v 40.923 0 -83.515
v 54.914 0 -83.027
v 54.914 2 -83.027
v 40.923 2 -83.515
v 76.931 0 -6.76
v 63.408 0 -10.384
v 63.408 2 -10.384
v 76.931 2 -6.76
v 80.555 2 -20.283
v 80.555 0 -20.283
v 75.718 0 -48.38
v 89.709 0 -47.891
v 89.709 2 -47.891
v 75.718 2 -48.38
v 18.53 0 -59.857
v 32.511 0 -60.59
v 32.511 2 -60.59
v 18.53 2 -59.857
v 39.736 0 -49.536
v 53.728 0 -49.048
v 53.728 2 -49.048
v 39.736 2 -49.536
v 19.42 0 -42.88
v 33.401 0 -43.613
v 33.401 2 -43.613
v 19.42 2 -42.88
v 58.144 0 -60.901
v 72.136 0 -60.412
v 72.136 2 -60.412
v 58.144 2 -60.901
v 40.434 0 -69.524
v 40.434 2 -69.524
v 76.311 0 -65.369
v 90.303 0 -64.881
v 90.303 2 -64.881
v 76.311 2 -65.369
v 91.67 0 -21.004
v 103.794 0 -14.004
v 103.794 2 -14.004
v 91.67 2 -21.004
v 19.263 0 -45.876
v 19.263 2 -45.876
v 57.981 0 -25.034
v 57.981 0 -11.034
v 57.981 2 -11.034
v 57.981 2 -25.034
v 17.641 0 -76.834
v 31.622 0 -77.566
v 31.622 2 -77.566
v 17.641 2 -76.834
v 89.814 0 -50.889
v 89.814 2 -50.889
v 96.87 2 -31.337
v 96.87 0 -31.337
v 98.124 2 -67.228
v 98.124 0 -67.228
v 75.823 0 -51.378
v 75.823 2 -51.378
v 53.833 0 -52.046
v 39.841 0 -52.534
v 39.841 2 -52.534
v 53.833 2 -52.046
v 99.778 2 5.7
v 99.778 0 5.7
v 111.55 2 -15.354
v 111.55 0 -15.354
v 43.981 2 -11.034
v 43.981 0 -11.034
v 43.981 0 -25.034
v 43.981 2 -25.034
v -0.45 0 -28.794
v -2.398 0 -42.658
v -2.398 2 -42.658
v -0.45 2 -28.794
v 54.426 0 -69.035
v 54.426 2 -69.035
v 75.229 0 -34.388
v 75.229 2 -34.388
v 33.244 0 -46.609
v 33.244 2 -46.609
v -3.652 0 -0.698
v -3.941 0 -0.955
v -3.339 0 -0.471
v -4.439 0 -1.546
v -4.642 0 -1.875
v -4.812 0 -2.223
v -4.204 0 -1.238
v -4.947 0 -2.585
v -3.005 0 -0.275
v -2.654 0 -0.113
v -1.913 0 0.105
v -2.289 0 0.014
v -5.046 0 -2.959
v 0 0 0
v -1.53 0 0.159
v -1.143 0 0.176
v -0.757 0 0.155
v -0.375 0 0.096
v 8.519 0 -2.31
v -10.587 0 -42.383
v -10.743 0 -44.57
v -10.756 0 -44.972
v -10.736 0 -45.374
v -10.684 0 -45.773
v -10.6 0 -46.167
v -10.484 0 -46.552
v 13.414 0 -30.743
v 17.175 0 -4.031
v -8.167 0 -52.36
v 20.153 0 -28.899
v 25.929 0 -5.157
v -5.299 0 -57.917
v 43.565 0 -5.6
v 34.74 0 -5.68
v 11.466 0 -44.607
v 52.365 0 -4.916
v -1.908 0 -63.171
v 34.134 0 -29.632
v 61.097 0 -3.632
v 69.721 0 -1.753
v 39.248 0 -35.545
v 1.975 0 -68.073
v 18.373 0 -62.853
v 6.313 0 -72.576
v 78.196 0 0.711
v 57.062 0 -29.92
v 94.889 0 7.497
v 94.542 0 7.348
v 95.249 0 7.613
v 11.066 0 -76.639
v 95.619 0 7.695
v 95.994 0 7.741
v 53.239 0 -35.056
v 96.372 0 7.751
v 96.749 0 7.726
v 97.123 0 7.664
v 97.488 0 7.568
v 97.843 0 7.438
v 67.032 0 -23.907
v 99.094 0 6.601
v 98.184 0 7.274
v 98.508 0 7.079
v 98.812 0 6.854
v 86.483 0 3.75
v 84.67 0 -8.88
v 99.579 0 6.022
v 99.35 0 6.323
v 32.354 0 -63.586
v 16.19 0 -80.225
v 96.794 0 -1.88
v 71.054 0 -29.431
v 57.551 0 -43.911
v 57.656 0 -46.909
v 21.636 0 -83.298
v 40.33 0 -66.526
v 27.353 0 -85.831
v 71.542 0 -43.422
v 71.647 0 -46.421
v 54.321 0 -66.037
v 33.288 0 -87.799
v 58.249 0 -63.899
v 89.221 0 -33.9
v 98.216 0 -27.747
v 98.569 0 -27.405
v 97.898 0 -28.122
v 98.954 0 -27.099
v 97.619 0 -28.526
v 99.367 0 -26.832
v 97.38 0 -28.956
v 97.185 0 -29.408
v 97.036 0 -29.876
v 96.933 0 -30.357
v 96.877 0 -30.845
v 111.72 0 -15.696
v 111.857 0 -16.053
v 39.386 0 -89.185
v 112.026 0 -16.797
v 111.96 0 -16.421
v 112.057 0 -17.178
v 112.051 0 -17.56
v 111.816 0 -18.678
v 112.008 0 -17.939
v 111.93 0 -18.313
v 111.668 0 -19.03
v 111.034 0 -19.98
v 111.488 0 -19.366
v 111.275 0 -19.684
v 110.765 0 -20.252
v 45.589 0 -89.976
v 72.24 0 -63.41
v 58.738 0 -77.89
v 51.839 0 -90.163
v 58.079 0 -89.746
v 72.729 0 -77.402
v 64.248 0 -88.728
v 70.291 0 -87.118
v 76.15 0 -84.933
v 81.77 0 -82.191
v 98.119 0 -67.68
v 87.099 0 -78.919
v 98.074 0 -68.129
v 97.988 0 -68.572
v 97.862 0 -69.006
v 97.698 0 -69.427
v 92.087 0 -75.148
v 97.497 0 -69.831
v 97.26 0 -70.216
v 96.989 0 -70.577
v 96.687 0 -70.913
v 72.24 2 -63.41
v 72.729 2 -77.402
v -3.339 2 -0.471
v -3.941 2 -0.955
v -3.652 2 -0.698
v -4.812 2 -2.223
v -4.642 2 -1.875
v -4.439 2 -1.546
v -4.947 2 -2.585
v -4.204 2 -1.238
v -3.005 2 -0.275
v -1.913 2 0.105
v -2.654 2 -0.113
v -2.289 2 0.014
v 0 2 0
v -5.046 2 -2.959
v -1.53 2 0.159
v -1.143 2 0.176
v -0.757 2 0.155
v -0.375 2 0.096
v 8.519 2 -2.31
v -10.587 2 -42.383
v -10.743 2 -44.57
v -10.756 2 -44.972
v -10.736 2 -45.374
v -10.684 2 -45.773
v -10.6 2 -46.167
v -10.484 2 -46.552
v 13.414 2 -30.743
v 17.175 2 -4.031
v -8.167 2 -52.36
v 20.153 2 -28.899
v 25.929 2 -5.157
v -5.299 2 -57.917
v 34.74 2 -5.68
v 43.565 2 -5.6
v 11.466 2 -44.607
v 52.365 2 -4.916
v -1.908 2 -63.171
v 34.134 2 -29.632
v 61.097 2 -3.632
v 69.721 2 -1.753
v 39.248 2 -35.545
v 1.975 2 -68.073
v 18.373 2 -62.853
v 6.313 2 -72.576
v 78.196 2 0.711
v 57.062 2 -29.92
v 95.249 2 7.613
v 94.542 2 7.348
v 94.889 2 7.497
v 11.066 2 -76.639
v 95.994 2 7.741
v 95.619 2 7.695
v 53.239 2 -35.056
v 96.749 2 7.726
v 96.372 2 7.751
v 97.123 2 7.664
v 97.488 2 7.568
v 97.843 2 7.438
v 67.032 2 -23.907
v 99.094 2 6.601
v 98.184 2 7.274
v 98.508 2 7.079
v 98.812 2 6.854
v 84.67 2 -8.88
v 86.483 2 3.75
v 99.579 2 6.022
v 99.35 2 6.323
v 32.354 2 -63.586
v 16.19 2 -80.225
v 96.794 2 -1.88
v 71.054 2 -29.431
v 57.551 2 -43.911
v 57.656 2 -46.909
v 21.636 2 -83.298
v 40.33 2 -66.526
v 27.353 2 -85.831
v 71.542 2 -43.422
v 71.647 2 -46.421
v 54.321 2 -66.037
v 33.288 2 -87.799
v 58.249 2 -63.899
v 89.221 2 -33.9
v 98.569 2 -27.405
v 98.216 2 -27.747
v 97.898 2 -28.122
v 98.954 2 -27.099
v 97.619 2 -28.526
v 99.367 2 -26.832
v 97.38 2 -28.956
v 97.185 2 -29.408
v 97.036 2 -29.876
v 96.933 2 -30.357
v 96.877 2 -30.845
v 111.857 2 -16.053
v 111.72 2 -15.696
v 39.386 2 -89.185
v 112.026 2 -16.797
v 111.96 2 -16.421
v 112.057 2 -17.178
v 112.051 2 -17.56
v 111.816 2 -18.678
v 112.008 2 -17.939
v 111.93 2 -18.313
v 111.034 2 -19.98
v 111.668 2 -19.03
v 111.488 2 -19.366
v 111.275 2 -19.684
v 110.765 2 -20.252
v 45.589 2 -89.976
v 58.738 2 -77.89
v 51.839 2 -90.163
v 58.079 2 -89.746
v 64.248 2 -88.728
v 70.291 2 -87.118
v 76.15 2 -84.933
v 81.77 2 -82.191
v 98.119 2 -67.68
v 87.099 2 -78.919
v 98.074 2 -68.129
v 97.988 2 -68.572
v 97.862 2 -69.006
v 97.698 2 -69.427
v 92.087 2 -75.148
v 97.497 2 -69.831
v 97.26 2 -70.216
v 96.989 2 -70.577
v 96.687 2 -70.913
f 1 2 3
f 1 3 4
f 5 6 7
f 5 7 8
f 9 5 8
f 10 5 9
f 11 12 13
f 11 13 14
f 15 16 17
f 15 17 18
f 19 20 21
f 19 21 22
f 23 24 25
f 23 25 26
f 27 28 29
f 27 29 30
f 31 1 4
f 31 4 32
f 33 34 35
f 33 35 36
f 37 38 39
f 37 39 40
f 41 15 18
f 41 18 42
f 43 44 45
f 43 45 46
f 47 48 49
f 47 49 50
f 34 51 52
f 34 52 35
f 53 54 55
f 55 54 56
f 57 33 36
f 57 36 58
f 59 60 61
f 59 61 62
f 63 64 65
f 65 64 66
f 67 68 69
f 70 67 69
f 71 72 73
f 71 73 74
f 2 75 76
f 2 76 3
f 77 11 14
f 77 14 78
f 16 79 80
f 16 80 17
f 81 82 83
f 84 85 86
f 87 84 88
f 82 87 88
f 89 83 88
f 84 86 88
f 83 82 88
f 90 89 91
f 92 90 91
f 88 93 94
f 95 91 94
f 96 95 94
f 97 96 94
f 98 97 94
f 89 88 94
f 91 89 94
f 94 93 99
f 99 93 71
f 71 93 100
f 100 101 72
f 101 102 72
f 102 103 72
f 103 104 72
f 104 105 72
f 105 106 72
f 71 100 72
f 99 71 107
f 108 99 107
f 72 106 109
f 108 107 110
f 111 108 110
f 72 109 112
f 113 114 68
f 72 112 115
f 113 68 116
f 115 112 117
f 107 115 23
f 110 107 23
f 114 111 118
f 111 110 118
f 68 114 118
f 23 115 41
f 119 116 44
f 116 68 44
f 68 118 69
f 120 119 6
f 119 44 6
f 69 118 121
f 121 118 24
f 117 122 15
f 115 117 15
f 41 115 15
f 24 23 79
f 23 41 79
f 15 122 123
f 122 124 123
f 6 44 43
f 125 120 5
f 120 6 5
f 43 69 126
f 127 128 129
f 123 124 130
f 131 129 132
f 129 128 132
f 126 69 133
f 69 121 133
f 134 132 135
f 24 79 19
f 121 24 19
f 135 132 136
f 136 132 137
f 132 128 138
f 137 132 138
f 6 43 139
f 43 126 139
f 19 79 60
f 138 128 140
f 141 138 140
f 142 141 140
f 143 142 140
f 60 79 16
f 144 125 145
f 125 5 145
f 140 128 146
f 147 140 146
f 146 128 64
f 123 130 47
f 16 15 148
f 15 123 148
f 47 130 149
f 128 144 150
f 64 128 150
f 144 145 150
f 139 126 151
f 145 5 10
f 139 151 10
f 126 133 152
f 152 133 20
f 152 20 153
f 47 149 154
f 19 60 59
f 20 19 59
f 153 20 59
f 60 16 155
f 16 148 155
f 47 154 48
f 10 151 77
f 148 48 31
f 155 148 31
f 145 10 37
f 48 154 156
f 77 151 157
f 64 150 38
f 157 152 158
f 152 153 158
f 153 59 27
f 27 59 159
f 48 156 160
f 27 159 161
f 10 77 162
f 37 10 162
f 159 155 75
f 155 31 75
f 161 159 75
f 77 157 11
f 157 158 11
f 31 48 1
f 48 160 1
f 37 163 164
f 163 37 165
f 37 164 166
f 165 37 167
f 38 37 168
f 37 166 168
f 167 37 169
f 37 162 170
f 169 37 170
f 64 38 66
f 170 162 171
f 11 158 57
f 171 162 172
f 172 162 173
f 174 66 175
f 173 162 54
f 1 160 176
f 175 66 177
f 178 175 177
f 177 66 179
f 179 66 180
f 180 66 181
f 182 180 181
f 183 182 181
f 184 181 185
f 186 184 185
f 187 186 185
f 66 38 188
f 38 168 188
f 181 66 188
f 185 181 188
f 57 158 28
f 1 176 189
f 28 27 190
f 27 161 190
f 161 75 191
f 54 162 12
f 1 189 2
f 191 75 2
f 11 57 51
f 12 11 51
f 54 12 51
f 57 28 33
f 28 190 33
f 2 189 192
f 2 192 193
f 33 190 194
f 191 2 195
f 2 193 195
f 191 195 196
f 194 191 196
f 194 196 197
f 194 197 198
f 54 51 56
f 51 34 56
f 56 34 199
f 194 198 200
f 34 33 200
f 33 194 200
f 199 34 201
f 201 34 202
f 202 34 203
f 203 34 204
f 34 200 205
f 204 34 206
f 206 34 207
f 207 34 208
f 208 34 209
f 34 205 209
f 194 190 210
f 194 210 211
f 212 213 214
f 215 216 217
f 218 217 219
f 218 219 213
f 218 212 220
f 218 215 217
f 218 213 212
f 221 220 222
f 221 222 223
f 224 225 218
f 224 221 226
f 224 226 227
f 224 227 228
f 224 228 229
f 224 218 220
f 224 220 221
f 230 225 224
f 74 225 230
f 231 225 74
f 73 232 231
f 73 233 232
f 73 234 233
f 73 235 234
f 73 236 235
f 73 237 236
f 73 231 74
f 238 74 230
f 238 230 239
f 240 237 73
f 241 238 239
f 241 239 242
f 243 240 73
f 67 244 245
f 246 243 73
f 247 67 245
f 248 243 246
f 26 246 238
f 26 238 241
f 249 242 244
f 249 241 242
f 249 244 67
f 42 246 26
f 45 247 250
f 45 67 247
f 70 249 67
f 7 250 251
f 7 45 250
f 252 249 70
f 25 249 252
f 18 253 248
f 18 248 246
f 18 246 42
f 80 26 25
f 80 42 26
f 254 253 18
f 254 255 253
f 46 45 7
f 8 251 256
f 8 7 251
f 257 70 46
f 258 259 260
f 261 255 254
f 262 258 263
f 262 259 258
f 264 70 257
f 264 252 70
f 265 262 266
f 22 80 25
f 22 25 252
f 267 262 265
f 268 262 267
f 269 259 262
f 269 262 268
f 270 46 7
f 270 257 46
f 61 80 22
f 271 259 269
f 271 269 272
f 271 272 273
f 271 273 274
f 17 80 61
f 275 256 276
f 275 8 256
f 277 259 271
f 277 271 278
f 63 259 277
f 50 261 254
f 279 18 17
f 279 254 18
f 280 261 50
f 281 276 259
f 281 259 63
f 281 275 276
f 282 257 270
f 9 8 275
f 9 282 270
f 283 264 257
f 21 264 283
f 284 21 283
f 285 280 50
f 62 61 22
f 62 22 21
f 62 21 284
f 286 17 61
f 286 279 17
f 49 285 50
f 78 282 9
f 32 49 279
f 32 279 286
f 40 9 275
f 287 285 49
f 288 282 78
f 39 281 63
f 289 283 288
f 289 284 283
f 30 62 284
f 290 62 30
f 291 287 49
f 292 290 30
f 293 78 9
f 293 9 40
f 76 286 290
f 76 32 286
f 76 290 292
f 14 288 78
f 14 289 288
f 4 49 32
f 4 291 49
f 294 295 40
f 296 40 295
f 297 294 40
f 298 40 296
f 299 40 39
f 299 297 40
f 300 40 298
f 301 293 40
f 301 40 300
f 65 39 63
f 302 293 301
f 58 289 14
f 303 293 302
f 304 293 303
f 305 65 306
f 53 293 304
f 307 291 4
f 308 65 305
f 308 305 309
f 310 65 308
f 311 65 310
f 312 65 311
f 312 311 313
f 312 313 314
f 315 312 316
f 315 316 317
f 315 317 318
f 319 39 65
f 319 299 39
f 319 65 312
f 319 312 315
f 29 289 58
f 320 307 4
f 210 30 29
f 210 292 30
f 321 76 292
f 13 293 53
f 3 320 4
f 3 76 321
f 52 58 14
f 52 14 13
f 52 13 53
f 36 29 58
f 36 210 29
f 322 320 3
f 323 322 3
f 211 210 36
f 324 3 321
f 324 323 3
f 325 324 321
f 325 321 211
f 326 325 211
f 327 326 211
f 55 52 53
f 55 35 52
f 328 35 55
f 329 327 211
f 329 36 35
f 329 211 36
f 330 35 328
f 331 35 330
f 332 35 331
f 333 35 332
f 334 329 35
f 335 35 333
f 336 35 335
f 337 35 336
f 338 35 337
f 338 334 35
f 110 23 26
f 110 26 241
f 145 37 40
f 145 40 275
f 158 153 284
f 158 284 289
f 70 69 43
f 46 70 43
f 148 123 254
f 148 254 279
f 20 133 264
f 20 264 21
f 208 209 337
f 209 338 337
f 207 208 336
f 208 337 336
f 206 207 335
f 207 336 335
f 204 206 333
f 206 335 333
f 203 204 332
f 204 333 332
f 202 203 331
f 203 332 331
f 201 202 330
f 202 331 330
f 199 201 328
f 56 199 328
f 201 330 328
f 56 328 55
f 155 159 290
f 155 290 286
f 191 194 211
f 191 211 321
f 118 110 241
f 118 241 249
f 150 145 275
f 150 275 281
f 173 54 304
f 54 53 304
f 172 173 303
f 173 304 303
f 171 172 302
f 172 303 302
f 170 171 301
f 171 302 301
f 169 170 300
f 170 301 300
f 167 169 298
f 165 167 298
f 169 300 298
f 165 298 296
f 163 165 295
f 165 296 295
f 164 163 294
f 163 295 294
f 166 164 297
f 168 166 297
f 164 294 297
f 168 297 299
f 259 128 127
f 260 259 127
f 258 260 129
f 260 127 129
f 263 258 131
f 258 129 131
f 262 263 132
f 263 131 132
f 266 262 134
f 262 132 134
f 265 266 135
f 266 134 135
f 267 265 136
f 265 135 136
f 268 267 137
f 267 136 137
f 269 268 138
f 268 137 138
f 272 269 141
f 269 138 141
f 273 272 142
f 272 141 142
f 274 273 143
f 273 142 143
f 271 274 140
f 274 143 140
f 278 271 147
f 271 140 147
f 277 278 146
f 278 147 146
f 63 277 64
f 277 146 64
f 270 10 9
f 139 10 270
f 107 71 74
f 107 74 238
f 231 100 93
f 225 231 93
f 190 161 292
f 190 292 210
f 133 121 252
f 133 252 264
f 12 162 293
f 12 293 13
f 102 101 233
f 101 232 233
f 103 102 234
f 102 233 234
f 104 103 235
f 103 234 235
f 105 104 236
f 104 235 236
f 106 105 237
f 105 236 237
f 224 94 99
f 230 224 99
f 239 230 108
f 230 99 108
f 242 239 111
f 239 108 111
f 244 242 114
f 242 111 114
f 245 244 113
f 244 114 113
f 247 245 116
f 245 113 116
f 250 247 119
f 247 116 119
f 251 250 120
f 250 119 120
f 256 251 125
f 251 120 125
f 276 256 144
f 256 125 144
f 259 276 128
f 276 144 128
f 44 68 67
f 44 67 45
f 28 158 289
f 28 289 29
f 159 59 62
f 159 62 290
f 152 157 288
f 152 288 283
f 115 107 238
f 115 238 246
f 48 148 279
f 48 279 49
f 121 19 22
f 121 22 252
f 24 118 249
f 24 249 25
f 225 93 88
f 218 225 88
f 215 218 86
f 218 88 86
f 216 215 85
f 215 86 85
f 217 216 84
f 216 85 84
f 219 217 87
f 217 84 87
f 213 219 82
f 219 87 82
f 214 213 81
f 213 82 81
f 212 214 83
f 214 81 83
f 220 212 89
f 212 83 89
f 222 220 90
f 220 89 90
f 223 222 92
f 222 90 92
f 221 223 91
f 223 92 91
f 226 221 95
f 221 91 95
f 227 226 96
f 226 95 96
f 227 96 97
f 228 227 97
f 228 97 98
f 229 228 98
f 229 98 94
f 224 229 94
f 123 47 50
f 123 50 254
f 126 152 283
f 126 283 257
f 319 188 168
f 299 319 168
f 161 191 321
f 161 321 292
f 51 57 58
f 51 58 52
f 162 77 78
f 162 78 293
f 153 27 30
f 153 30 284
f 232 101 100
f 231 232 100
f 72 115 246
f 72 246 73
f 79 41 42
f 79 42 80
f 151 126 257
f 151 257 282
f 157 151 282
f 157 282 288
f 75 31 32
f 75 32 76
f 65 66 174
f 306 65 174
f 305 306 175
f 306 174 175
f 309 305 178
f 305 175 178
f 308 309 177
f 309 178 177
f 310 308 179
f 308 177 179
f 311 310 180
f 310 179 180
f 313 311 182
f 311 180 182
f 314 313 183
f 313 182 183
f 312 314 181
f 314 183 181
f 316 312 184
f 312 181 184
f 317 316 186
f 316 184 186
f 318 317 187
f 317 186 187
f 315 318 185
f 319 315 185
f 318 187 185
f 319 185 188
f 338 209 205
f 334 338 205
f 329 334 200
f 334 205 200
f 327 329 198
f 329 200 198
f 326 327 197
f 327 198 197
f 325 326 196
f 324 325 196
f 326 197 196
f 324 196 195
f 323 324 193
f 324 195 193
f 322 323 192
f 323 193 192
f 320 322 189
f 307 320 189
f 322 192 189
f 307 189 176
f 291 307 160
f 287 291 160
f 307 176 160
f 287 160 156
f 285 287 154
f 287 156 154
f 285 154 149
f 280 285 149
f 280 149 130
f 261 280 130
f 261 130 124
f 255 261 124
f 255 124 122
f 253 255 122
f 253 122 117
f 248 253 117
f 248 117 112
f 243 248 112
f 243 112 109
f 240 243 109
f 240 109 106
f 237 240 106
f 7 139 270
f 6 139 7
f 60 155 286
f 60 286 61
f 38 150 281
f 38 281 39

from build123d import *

# Parameters (mm, degrees)
SKETCH1_W           = 14
SKETCH1_H           = 14
BOSS_EXTRUDE1_DEPTH = 2
FILLET1_R           = 5


with BuildPart() as part:
    # Sketch1 → Boss-Extrude1 (new body)
    with BuildSketch(Plane(origin=(0, 0, 0), x_dir=(1, 0, 0), z_dir=(0, 1, 0))):
        with BuildLine():
            Line((-10.586983819, 42.383324584), (-5.046266953, 2.959075179))
            ThreePointArc((-5.046266953, 2.959075179), (-3.174441029, 0.368828473), (0, 0))
            ThreePointArc((0, 0), (47.971062986, 5.333423777), (94.542026123, -7.347809821))
            ThreePointArc((94.542026123, -7.347809821), (97.488396157, -7.568143239), (99.777690602, -5.700317192))
            Line((99.777690602, -5.700317192), (111.550095971, 15.354261283))
            ThreePointArc((111.550095971, 15.354261283), (112.008410414, 17.939225635), (110.765402582, 20.251589006))
            Line((110.765402582, 20.251589006), (96.765402582, 28.334492774))
            Line((96.765402582, 28.334492774), (98.196951267, 69.32867968))
            ThreePointArc((98.196951267, 69.32867968), (36.880667069, 88.690951376), (-10.814532638, 45.566107052))
            Line((-10.814532638, 45.566107052), (-10.586983819, 42.383324584))
        make_face()
        Polygon((-0.449562029, 28.794432983), (13.414190971, 30.742856383), (11.465767571, 44.606609383), (-2.397985429, 42.658185983), align=None, mode=Mode.SUBTRACT)
        Polygon((20.152865671, 28.899486483), (34.133679071, 29.632189883), (33.400975671, 43.613003283), (19.420162271, 42.880299883), align=None, mode=Mode.SUBTRACT)
        Polygon((19.263154371, 45.876188583), (33.243967771, 46.608891983), (32.511264371, 60.589705383), (18.530450971, 59.857001983), align=None, mode=Mode.SUBTRACT)
        Polygon((18.373443071, 62.852890683), (32.354256471, 63.585594083), (31.621553071, 77.566407483), (17.640739671, 76.833704083), align=None, mode=Mode.SUBTRACT)
        Polygon((39.247799271, 35.544672383), (53.239270871, 35.056079383), (53.727863871, 49.047550983), (39.736392271, 49.536143983), align=None, mode=Mode.SUBTRACT)
        Polygon((39.841090671, 52.534316483), (53.832562271, 52.045723483), (54.321155271, 66.037195083), (40.329683671, 66.525788083), align=None, mode=Mode.SUBTRACT)
        Polygon((40.434382071, 69.523960583), (54.425853671, 69.035367583), (54.914446671, 83.026839183), (40.922975071, 83.515432183), align=None, mode=Mode.SUBTRACT)
        Polygon((57.062336771, 29.919527383), (71.053808371, 29.430934383), (71.542401371, 43.422405983), (57.550929771, 43.910998983), align=None, mode=Mode.SUBTRACT)
        Polygon((57.655628171, 46.909171483), (71.647099771, 46.420578483), (72.135692771, 60.412050083), (58.144221171, 60.900643083), align=None, mode=Mode.SUBTRACT)
        Polygon((58.248919571, 63.898815583), (72.240391171, 63.410222583), (72.728984171, 77.401694183), (58.737512571, 77.890287183), align=None, mode=Mode.SUBTRACT)
        Polygon((75.229359071, 34.388229583), (89.220830671, 33.899636583), (89.709423671, 47.891108183), (75.717952071, 48.379701183), align=None, mode=Mode.SUBTRACT)
        Polygon((75.822650471, 51.377873683), (89.814122071, 50.889280683), (90.302715071, 64.880752283), (76.311243471, 65.369345283), align=None, mode=Mode.SUBTRACT)
        with Locations((50.981291271, 18.033609783)):
            Rectangle(SKETCH1_W, SKETCH1_H, mode=Mode.SUBTRACT)
        Polygon((63.408077171, 10.383862283), (76.931038771, 6.760395683), (80.554505371, 20.283357283), (67.031543771, 23.906823883), align=None, mode=Mode.SUBTRACT)
        Polygon((96.794438284, 1.879855106), (103.794438261, 14.00421072), (91.670082648, 21.004210697), (84.670082671, 8.879855083), align=None, mode=Mode.SUBTRACT)
    extrude(amount=BOSS_EXTRUDE1_DEPTH)

    # Fillet1
    fillet1_edges = [part.edges().sort_by_distance(p)[0] for p in [
        (96.765402582, 1, -28.334492774),
        (-10.814532638, 1, -45.566107052),
        (98.196951267, 1, -69.32867968),
    ]]
    fillet(fillet1_edges, radius=FILLET1_R)


solid = part.part
